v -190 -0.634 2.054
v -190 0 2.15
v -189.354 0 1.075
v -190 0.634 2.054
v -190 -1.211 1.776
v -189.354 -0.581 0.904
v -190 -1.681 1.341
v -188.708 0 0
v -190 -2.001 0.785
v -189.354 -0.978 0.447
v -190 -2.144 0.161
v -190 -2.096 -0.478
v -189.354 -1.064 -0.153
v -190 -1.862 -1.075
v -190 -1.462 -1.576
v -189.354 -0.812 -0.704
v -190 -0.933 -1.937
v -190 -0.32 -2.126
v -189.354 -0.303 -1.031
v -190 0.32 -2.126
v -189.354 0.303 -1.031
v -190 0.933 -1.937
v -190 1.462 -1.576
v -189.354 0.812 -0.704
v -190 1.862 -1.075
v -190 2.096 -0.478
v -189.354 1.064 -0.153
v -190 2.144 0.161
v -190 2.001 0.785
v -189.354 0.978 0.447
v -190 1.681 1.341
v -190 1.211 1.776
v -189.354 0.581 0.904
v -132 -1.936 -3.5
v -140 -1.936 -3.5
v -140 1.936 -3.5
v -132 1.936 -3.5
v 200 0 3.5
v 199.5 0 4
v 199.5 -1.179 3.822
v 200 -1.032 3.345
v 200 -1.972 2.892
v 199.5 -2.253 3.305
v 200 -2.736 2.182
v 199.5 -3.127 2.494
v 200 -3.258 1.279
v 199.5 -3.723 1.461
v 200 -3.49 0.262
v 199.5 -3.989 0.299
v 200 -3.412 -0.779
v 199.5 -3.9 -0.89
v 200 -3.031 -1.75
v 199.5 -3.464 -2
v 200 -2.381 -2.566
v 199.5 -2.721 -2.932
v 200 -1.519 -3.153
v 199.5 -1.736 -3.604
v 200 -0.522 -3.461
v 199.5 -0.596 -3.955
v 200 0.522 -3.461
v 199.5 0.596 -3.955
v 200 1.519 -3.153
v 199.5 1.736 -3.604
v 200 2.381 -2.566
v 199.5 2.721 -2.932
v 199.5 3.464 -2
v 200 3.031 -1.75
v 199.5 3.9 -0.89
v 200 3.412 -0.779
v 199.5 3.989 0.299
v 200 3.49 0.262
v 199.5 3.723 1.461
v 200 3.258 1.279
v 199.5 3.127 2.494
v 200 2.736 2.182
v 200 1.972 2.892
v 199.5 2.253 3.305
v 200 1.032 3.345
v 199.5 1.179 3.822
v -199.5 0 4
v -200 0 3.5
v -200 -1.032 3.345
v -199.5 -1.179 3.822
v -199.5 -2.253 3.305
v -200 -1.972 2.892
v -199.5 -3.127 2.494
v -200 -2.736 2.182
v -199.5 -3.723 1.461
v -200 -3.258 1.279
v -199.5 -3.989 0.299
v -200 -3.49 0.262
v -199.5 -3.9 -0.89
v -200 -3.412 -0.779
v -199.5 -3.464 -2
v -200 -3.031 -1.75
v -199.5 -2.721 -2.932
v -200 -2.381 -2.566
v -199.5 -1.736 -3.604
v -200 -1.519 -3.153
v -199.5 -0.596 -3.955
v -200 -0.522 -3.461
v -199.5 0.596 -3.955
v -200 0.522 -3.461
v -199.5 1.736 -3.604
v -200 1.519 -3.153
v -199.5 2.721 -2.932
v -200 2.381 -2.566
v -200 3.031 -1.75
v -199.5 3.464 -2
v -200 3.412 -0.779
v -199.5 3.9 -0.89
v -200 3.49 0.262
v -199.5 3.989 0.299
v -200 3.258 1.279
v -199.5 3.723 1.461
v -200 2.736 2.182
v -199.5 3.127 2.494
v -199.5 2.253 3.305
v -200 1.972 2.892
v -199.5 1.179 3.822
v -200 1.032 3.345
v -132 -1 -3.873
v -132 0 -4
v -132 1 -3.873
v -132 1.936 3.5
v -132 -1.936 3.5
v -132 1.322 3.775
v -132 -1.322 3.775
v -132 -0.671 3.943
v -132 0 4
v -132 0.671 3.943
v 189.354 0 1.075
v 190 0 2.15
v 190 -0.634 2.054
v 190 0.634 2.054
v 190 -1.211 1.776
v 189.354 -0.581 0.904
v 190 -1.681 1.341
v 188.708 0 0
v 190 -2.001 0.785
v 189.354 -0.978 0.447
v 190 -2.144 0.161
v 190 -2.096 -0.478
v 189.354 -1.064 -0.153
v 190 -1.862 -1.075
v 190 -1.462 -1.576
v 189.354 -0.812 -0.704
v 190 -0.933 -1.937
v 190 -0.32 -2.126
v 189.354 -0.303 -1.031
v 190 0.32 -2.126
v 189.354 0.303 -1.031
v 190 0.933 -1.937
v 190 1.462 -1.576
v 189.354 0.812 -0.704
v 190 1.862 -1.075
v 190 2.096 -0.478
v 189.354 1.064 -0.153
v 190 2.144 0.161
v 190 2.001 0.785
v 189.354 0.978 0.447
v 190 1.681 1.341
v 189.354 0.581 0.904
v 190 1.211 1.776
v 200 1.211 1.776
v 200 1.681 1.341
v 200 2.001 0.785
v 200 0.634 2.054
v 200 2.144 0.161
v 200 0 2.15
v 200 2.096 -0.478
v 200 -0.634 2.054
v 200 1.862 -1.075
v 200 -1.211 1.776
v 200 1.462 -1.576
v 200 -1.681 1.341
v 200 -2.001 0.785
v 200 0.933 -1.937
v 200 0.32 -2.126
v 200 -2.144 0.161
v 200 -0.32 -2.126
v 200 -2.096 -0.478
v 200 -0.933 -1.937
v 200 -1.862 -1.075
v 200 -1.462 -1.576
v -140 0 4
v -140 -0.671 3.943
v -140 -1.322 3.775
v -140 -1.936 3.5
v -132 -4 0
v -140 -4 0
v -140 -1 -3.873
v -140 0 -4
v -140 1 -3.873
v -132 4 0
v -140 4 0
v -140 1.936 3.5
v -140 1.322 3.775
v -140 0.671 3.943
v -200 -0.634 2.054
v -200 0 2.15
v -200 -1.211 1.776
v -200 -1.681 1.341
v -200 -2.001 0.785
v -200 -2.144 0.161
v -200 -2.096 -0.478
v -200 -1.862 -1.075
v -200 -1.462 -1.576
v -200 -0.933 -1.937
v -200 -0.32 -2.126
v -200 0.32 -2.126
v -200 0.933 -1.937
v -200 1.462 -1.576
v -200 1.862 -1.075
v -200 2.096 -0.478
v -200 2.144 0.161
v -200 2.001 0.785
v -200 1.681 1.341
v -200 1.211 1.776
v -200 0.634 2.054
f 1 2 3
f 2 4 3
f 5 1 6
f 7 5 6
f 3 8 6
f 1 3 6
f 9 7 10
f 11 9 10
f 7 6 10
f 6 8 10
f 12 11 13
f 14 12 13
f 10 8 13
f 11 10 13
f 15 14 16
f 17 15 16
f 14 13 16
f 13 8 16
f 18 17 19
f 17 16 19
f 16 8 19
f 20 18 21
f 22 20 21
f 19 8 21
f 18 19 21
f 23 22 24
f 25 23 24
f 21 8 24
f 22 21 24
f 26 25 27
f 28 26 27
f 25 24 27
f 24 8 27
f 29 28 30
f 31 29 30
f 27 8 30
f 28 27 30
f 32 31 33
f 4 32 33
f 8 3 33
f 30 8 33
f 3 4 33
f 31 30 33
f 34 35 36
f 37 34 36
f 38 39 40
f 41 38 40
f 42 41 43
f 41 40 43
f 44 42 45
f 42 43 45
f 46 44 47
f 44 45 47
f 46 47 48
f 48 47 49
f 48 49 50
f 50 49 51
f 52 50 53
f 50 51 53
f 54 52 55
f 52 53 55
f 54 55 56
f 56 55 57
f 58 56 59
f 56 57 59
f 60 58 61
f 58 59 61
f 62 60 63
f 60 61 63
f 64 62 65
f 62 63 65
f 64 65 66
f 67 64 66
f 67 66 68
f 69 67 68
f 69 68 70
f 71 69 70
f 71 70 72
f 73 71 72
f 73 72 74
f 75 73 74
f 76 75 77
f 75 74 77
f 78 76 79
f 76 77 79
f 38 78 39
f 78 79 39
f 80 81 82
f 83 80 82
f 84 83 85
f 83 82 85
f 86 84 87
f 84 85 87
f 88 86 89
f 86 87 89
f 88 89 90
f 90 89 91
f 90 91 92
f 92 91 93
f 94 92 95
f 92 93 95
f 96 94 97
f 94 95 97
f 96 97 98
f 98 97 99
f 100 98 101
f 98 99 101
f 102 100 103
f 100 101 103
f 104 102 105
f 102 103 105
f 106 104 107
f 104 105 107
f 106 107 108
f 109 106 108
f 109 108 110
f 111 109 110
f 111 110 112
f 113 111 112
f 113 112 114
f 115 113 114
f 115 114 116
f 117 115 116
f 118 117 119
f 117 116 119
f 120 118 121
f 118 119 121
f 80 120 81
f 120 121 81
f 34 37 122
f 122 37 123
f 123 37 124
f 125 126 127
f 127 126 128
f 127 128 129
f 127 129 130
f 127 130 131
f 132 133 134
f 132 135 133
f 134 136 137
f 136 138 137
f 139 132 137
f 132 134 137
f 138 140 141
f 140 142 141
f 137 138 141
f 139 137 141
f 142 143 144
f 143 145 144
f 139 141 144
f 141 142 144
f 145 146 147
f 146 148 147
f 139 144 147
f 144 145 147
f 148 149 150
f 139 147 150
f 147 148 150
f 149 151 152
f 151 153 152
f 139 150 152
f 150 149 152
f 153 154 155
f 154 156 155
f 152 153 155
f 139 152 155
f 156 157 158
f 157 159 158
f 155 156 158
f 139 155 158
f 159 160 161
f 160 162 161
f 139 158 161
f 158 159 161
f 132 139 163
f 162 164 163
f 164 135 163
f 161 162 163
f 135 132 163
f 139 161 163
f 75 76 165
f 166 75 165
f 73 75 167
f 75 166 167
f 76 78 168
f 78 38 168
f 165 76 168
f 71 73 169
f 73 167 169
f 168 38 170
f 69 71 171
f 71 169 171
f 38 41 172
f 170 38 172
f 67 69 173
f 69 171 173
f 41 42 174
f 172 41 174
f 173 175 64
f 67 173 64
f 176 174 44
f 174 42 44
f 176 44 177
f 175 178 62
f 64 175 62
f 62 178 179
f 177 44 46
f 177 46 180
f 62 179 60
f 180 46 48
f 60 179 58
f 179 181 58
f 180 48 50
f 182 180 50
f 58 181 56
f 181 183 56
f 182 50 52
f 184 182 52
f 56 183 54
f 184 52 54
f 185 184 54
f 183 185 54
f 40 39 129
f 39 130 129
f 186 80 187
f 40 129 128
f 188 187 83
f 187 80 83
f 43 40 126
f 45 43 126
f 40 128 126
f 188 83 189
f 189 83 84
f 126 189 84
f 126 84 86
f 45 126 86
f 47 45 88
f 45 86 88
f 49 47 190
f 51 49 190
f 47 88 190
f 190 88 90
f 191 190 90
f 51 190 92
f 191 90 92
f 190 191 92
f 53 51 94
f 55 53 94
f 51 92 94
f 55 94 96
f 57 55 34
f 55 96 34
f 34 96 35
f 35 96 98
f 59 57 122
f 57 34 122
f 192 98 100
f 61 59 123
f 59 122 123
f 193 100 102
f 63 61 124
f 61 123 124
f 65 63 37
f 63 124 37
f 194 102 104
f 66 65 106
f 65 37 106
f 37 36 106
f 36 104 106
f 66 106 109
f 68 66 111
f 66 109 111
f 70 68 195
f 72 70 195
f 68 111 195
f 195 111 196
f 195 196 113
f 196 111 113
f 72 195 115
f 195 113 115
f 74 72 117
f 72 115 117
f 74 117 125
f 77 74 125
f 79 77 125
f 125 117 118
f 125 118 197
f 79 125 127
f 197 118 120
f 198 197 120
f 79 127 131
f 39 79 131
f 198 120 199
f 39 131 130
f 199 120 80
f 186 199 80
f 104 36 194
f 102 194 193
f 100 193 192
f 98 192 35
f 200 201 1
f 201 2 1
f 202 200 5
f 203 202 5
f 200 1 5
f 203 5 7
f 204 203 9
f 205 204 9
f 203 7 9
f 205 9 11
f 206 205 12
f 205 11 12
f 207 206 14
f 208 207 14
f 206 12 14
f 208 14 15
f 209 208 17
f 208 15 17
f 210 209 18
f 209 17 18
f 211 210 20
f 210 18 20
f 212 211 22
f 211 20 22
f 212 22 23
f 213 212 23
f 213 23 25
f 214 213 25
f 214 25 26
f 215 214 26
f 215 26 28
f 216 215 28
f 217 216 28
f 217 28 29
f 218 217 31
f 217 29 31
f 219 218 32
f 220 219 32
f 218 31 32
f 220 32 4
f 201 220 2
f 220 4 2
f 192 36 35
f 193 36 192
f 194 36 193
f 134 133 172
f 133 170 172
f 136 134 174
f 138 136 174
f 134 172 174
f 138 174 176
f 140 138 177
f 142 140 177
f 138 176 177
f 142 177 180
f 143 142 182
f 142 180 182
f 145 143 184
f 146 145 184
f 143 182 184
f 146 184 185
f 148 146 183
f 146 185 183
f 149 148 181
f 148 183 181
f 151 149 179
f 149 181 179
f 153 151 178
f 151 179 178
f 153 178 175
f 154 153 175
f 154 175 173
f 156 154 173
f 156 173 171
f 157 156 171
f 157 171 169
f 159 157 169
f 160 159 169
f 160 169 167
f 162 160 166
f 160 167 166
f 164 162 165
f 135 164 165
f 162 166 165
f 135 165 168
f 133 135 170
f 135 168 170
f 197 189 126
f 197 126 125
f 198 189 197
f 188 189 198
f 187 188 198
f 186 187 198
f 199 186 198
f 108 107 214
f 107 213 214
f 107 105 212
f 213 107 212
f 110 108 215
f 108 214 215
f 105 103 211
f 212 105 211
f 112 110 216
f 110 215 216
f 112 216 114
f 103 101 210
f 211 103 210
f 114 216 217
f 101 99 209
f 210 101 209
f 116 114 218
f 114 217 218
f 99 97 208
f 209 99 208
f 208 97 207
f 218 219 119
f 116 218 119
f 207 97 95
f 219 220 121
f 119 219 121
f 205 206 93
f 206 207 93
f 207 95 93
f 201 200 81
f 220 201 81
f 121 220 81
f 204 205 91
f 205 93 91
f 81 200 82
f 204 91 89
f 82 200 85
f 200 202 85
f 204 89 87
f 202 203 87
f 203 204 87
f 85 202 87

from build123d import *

# Parameters (mm, degrees)
CHAMFER_1_SIZE       = 0.5
SKETCH_2_OUTSIDE_W   = 90.032
SKETCH_2_OUTSIDE_H   = 90.032
SKETCH_2_OUTSIDE_W_2 = 7
SKETCH_2_OUTSIDE_H_2 = 8
CUT_EXTRUDE_1_DEPTH  = 8


with BuildPart() as part:
    # 草图1 → 旋转1 (revolve)
    with BuildSketch(Plane.XY, mode=Mode.PRIVATE) as revolve_1_sk:
        Polygon((-200, 2.15), (-190, 2.15), (-188.708149669, 0), (188.708149669, 0), (190, 2.15), (200, 2.15), (200, 4), (-200, 4), align=None)
    revolve(revolve_1_sk.sketch.rotate(Axis((0, 0, 0), (1, 0, 0)), 90), axis=Axis((0, 0, 0), (1, 0, 0)))

    # 倒角1
    chamfer_1_edges = [part.edges().sort_by_distance(p)[0] for p in [
        (-200, 0, -4),
        (200, 0, -4),
    ]]
    chamfer(chamfer_1_edges, length=CHAMFER_1_SIZE)

    # 草图2 outside → 切除-拉伸1 (cut)
    with BuildSketch(Plane.ZY.offset(140)):
        Rectangle(SKETCH_2_OUTSIDE_W, SKETCH_2_OUTSIDE_H)
        Rectangle(SKETCH_2_OUTSIDE_W_2, SKETCH_2_OUTSIDE_H_2, mode=Mode.SUBTRACT)
    extrude(amount=-CUT_EXTRUDE_1_DEPTH, mode=Mode.SUBTRACT)


solid = part.part
